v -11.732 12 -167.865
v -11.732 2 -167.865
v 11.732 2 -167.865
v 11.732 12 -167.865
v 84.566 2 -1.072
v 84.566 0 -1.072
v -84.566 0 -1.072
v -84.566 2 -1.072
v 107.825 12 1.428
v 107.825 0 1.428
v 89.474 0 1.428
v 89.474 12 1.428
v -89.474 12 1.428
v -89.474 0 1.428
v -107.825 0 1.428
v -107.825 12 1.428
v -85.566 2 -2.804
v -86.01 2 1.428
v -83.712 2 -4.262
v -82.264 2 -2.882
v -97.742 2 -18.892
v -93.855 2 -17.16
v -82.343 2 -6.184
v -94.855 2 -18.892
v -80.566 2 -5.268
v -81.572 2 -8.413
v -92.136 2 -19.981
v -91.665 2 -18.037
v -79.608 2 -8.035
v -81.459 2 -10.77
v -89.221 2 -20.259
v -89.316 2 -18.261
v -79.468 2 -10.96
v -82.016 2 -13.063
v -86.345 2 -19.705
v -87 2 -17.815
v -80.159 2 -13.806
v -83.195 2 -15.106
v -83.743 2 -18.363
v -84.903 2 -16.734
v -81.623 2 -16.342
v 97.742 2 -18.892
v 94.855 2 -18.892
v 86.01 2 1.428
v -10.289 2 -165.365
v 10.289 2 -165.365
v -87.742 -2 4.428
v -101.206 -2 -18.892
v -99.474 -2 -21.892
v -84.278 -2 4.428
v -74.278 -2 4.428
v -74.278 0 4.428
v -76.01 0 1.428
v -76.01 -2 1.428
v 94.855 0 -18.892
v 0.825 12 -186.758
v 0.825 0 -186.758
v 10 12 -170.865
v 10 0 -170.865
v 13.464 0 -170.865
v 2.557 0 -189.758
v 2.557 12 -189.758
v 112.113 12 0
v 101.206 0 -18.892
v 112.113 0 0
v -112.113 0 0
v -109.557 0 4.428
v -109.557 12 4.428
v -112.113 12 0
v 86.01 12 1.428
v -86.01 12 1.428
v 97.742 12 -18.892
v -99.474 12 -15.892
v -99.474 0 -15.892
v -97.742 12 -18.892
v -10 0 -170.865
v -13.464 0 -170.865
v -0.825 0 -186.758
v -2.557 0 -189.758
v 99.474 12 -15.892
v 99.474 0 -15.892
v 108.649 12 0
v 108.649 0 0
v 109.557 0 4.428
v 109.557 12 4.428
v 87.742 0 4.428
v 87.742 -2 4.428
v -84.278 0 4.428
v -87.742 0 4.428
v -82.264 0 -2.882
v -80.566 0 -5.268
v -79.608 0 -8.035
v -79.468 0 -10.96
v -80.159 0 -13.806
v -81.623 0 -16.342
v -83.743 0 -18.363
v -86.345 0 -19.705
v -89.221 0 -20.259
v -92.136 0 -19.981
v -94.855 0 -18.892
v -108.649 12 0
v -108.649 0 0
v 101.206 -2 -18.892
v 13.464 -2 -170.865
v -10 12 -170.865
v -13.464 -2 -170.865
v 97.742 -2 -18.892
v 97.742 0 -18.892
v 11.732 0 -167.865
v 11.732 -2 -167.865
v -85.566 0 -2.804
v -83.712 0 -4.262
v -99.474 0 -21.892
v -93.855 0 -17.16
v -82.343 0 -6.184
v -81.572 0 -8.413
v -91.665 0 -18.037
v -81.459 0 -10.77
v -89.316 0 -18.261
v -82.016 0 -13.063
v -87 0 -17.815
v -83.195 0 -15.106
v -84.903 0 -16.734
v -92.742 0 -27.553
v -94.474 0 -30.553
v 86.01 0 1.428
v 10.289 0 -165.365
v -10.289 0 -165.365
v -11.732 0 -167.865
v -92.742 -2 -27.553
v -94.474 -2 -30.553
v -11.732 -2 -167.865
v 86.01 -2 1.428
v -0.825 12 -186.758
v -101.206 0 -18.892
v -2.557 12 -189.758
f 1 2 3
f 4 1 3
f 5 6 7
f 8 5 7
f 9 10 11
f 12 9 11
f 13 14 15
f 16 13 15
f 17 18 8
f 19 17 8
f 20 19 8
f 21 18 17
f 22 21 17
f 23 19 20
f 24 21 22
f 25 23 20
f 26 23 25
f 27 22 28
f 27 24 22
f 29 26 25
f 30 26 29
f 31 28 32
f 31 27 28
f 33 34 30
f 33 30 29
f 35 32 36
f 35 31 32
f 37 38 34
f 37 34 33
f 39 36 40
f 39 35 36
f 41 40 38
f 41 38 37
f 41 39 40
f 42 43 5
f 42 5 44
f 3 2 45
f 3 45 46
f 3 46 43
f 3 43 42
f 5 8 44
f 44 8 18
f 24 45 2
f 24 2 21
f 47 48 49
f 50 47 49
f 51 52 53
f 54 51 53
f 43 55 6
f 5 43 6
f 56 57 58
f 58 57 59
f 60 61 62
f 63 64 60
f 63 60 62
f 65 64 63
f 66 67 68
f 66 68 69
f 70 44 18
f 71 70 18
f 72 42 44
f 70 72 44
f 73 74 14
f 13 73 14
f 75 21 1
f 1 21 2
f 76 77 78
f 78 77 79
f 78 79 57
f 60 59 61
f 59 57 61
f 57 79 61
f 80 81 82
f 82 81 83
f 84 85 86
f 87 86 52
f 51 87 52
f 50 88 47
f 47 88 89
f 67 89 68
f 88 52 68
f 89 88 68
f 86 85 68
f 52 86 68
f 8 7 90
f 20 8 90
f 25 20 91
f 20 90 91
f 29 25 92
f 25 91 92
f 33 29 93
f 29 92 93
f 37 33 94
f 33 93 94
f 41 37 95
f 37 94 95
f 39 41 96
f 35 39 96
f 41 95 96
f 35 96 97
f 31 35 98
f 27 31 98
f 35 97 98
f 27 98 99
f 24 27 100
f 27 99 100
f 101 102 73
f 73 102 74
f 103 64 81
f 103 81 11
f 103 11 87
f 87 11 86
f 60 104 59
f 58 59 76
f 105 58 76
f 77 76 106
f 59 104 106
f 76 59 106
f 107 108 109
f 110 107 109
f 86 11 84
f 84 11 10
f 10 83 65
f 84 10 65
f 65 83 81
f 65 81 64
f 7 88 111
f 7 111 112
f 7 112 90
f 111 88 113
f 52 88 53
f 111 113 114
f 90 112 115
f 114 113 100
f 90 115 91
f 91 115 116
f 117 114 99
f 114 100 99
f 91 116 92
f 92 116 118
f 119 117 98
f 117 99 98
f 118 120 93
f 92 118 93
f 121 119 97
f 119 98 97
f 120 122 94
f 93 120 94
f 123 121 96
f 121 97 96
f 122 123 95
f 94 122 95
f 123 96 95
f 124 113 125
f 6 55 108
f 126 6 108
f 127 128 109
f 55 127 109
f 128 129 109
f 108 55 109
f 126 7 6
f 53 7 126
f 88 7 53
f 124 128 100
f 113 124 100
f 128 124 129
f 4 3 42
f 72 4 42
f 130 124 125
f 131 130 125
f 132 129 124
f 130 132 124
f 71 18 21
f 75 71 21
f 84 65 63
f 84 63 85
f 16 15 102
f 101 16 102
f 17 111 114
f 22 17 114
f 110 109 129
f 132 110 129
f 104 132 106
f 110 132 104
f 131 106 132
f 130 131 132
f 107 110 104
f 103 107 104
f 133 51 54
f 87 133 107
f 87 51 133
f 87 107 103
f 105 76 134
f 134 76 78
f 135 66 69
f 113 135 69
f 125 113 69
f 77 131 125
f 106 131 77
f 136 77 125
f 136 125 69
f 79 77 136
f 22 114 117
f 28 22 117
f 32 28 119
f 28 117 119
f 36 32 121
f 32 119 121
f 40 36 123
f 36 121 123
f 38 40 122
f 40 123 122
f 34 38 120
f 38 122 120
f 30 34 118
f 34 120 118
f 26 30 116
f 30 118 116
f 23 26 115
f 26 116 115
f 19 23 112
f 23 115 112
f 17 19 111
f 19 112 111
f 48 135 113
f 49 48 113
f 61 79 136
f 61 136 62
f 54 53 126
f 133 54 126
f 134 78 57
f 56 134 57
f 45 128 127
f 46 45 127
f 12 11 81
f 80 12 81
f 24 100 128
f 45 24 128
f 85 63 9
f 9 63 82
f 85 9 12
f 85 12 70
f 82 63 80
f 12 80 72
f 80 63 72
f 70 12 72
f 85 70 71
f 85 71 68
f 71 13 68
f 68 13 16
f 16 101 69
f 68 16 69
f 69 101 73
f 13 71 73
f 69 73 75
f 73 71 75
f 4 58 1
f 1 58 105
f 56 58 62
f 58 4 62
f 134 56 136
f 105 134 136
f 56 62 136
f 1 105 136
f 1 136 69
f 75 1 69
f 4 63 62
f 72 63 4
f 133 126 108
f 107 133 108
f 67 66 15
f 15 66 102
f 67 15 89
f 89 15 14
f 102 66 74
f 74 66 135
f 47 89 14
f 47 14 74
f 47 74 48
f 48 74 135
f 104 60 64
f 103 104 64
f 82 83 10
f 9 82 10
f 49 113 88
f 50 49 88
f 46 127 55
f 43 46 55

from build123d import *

# Parameters (mm, degrees)
BOSS_EXTRUDE1_DEPTH = 12
BOSS_EXTRUDE2_DEPTH = 2
BOSS_EXTRUDE3_DEPTH = 2


with BuildPart() as part:
    # Sketch1 → Boss-Extrude1 (new body)
    with BuildSketch(Plane(origin=(0, 0, 0), x_dir=(1, 0, 0), z_dir=(0, 1, 0))):
        Polygon((109.556624327, -4.42820323), (-109.556624327, -4.42820323), (-112.113248654, 0), (-2.556624327, 189.75763964), (2.556624326, 189.75763964), (112.113248654, 0), align=None)
        Polygon((-107.82457352, -1.42820323), (-108.649147039, 0), (-99.473720558, 15.892304845), (-89.473720558, -1.42820323), align=None, mode=Mode.SUBTRACT)
        Polygon((-0.82457352, 186.75763964), (0.824573518, 186.75763964), (9.999999999, 170.865334794), (-10.000000001, 170.865334794), align=None, mode=Mode.SUBTRACT)
        Polygon((108.649147039, 0), (107.82457352, -1.42820323), (89.473720559, -1.42820323), (99.473720559, 15.892304846), align=None, mode=Mode.SUBTRACT)
        Polygon((-11.732050808, 167.865334795), (11.732050808, 167.865334795), (97.741669751, 18.892304846), (86.009618944, -1.42820323), (-86.009618943, -1.42820323), (-97.741669751, 18.892304845), align=None, mode=Mode.SUBTRACT)
    extrude(amount=BOSS_EXTRUDE1_DEPTH)

    # Sketch1<4> → Boss-Extrude2 (add)
    with BuildSketch(Plane(origin=(0, 0, 0), x_dir=(1, 0, 0), z_dir=(0, 1, 0))):
        Polygon((11.732050808, 167.865334795), (-11.732050808, 167.865334795), (-97.741669751, 18.892304845), (-86.009618943, -1.42820323), (86.009618944, -1.42820323), (97.741669751, 18.892304846), align=None)
        with BuildLine():
            Line((-85.56624327, 2.803847577), (-93.854918405, 17.160254038))
            ThreePointArc((-93.854918405, 17.160254038), (-82.532377607, 14.126388375), (-85.56624327, 2.803847577))
        make_face(mode=Mode.SUBTRACT)
        with BuildLine():
            Line((84.566243271, 1.07179677), (-84.56624327, 1.07179677))
            ThreePointArc((-84.56624327, 1.07179677), (-80.800326799, 15.126388375), (-94.854918405, 18.892304845))
            Line((-94.854918405, 18.892304845), (-10.288675135, 165.365334795))
            Line((-10.288675135, 165.365334795), (10.288675135, 165.365334795))
            Line((10.288675135, 165.365334795), (94.854918405, 18.892304846))
            Line((94.854918405, 18.892304846), (84.566243271, 1.07179677))
        make_face(mode=Mode.SUBTRACT)
    extrude(amount=BOSS_EXTRUDE2_DEPTH)

    # Sketch2 → Boss-Extrude3 (add)
    with BuildSketch(Plane.XZ):
        Polygon((-87.741669751, 4.42820323), (-101.205771366, -18.892304846), (-99.473720559, -21.892304845), (-84.277568136, 4.42820323), align=None)
        Polygon((87.741669751, 4.42820323), (-74.277568136, 4.42820323), (-76.009618943, 1.42820323), (86.009618943, 1.42820323), (97.74166975, -18.892304845), (11.732050807, -167.865334795), (-11.732050808, -167.865334795), (-92.741669751, -27.552558883), (-94.473720559, -30.552558883), (-13.464101616, -170.865334794), (13.464101615, -170.865334794), (101.205771366, -18.892304845), align=None)
    extrude(amount=BOSS_EXTRUDE3_DEPTH)


solid = part.part
